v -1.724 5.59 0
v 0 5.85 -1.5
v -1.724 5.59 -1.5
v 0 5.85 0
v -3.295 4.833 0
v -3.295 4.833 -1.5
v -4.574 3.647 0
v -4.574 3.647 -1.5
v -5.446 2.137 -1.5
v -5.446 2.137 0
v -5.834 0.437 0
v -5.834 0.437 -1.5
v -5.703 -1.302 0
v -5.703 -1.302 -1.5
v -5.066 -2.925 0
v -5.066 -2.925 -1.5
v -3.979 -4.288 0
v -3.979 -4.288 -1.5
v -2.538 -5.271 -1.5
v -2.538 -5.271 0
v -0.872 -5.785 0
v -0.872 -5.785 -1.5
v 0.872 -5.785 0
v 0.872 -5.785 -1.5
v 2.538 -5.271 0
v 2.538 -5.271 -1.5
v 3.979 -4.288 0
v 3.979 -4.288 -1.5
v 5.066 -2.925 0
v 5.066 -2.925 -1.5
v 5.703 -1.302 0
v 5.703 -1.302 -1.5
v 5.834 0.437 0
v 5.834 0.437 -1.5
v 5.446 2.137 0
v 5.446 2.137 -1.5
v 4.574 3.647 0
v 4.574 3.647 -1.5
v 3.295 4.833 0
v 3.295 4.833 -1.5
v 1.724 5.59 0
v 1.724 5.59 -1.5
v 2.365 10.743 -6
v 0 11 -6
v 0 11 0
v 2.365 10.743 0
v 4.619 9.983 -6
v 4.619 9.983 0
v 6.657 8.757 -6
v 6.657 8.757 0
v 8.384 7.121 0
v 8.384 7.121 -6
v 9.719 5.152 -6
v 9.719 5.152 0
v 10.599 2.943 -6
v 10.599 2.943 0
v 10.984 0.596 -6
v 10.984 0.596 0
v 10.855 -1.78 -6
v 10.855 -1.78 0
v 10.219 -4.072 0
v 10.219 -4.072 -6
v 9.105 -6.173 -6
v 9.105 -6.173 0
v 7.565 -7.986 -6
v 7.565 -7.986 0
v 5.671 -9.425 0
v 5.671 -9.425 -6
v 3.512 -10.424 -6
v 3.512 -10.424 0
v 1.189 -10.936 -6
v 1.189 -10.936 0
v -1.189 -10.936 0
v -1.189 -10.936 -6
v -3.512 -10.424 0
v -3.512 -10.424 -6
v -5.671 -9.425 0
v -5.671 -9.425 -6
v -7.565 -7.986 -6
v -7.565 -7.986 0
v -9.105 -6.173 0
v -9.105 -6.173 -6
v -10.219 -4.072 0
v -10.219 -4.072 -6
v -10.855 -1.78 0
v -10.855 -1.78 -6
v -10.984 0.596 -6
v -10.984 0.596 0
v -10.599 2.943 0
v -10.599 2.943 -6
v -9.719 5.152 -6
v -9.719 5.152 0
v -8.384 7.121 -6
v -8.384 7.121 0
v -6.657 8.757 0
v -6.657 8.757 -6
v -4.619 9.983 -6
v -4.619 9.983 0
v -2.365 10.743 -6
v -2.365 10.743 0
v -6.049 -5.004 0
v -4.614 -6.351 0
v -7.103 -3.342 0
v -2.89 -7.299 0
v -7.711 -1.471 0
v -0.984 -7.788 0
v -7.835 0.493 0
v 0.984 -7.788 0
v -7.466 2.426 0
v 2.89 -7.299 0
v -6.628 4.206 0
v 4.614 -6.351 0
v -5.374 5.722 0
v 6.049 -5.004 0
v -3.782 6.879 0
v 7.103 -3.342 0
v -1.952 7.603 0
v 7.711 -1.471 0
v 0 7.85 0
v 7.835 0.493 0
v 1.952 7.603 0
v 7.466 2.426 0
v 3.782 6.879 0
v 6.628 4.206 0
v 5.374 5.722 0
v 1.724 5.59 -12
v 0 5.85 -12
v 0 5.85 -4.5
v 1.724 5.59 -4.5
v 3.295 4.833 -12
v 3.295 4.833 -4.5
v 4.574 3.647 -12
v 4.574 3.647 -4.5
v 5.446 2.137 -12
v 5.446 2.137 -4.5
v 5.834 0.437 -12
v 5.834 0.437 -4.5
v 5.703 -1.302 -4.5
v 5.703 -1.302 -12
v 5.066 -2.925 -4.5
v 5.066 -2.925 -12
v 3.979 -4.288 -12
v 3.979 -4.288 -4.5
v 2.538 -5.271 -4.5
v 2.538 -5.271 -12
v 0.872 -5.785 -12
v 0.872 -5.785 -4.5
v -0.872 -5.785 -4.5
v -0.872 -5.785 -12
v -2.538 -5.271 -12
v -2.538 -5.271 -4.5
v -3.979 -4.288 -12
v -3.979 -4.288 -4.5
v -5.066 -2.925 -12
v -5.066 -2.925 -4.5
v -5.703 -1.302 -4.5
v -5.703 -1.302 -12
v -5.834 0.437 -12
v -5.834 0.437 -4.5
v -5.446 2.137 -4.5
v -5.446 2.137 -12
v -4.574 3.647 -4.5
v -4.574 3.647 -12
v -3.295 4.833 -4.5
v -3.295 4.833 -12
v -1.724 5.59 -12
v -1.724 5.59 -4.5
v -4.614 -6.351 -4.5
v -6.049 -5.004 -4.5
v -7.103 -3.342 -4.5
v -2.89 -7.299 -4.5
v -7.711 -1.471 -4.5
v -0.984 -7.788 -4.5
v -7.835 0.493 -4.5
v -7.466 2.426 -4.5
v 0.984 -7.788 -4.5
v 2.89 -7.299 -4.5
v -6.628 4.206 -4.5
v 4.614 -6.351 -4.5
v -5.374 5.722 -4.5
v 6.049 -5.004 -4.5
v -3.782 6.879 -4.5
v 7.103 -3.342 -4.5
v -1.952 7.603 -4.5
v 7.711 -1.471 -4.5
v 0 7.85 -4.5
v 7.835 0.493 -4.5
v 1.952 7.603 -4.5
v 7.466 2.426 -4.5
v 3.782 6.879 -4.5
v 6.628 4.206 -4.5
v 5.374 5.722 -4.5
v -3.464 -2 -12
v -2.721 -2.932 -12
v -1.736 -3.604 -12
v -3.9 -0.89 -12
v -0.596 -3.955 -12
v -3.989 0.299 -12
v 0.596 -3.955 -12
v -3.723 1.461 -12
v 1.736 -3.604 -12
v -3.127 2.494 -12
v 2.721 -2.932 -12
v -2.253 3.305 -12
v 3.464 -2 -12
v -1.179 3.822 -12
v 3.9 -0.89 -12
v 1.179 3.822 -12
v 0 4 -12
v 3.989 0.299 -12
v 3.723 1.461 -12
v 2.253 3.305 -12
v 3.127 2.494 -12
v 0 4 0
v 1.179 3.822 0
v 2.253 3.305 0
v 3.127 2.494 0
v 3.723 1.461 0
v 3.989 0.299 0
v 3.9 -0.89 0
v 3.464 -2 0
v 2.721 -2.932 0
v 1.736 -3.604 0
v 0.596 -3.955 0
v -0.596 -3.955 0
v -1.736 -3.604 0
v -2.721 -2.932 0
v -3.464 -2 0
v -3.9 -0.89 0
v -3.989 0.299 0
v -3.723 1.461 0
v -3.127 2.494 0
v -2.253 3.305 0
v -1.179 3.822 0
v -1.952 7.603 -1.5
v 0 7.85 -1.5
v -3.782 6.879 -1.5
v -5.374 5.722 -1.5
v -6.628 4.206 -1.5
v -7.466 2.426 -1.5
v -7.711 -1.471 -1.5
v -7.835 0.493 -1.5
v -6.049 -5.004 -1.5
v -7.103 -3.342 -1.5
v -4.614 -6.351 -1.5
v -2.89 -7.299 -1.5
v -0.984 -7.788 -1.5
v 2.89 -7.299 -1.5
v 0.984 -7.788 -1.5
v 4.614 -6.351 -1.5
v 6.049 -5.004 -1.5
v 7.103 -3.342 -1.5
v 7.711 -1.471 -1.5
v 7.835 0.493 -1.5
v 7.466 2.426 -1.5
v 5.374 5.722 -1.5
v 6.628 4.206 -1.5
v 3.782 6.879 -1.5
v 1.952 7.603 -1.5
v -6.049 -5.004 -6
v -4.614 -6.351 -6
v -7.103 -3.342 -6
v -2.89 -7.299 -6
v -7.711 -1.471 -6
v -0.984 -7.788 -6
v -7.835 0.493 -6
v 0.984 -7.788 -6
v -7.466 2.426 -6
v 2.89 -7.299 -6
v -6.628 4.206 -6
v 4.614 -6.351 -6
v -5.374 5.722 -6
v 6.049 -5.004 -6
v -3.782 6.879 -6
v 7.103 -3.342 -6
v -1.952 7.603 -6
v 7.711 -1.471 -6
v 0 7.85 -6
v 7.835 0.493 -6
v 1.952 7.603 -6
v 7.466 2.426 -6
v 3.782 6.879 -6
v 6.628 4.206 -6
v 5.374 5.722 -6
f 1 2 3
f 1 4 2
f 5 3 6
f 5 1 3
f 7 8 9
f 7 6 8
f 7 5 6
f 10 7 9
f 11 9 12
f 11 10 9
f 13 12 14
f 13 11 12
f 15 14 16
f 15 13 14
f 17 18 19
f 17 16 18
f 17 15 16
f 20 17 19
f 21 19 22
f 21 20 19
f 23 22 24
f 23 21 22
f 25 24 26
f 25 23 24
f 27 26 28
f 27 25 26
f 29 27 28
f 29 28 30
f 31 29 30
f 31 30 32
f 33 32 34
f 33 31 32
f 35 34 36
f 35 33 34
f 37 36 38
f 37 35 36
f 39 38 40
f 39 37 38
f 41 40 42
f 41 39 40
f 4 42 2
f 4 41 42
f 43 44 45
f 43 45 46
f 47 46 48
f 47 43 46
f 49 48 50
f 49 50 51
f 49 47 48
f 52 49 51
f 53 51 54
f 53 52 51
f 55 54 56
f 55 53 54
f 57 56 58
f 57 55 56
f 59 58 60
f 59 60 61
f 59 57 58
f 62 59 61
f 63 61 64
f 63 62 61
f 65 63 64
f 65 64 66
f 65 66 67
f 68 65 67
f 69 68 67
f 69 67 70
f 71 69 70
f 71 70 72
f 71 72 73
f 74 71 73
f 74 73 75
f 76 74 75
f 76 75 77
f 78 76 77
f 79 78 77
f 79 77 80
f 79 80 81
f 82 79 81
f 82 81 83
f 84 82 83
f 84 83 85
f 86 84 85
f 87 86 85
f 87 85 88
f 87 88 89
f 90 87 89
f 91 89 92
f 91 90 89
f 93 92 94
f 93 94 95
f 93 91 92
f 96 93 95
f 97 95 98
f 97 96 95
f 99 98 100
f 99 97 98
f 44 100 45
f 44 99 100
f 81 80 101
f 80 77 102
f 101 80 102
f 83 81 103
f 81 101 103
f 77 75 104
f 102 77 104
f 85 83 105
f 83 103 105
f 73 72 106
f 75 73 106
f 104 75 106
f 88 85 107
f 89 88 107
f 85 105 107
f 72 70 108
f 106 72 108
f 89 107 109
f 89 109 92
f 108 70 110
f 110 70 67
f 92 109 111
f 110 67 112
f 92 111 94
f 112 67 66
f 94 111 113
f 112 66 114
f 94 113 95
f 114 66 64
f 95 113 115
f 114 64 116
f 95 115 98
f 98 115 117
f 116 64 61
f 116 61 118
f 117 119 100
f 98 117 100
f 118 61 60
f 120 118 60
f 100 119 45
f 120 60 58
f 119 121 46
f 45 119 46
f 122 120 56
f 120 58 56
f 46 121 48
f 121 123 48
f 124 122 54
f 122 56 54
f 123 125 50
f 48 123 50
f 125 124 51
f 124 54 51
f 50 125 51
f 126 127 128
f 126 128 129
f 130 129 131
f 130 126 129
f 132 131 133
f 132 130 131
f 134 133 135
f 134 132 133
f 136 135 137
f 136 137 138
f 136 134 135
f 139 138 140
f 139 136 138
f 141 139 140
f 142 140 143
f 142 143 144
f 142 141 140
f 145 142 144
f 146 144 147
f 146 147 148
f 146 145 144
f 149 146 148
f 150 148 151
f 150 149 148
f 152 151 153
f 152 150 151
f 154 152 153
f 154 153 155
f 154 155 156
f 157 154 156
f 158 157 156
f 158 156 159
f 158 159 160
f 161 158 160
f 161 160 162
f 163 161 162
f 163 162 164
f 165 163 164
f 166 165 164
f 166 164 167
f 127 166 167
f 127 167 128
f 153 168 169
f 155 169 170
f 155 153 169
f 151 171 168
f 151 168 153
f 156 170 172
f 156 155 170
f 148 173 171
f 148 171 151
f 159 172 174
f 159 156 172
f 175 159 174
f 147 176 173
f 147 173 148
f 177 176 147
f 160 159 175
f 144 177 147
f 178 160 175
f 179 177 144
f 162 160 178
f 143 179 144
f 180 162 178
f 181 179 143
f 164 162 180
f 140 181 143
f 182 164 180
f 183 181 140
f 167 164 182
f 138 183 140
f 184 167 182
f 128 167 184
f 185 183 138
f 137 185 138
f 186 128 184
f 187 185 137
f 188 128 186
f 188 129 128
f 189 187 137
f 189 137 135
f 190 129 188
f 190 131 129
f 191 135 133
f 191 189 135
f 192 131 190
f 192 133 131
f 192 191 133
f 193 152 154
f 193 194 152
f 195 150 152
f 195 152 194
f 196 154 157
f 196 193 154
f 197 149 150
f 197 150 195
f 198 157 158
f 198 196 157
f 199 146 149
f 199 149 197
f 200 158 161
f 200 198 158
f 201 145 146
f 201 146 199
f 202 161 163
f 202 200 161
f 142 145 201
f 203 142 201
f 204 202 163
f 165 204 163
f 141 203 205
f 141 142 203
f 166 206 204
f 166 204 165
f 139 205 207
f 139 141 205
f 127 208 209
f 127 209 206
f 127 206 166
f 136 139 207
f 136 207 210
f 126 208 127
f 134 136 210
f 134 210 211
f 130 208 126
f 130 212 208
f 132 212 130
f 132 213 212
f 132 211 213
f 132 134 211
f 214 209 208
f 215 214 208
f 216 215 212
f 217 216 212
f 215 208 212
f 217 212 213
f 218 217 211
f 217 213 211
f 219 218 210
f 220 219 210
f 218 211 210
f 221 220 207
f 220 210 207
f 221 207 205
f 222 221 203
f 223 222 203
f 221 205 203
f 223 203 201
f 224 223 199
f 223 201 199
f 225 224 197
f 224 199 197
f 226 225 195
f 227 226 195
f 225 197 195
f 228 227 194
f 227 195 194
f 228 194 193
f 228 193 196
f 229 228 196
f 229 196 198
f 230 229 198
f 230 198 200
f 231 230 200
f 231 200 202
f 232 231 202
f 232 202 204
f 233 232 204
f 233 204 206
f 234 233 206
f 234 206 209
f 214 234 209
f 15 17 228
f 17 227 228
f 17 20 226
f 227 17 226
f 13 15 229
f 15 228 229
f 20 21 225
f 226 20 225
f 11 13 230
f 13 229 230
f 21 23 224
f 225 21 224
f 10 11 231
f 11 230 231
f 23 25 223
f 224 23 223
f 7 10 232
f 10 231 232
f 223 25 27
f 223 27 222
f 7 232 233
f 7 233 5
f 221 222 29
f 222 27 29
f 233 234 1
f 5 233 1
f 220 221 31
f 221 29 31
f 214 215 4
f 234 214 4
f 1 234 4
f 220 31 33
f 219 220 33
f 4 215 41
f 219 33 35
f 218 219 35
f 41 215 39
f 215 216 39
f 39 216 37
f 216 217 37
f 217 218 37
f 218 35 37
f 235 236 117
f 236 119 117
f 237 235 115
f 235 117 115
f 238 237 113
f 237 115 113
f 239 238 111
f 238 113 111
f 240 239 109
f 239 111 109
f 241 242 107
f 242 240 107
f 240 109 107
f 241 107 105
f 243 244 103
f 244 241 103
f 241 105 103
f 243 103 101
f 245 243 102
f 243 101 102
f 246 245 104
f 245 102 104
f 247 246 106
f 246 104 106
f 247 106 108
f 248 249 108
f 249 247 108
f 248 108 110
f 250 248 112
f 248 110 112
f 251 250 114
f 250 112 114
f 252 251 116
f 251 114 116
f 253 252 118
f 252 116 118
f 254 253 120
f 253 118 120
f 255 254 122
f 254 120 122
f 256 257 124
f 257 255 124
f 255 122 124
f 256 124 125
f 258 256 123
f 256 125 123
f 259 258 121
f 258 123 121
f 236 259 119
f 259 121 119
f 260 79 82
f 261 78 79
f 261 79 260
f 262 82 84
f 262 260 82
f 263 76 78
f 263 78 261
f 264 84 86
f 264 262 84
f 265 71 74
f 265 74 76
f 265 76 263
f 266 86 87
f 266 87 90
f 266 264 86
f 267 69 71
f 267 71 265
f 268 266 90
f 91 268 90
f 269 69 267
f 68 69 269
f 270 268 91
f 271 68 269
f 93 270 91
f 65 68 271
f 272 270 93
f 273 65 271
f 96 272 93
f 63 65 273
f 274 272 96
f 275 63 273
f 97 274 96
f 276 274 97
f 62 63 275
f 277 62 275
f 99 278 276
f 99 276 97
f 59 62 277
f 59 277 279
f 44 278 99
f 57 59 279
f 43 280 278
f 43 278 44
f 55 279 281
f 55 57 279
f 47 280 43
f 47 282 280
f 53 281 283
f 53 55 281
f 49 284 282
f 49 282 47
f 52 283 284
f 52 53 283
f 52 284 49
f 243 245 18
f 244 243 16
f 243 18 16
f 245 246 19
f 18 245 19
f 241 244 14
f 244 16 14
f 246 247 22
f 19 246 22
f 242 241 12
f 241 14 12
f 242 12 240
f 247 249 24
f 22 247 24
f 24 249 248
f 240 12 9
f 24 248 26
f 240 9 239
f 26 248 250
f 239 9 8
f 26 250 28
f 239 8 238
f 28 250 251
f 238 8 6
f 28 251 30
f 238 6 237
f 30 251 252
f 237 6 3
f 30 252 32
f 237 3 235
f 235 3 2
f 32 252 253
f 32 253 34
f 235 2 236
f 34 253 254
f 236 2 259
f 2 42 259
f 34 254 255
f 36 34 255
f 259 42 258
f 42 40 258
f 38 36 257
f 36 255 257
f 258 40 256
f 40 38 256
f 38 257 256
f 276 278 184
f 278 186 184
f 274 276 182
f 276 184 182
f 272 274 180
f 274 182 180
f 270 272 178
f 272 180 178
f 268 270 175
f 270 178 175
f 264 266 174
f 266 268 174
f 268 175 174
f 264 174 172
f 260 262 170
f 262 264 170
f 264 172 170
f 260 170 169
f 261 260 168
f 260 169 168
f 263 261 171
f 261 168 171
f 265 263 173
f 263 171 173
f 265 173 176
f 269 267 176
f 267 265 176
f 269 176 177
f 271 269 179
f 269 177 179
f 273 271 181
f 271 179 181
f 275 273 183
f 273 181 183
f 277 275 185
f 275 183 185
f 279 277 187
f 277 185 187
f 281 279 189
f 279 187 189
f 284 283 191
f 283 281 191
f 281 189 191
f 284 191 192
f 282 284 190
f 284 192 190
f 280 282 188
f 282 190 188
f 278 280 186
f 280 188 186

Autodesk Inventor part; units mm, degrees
ref_plane "YZ Plane" through (0, 0, 0) normal (1, 0, 0) x (0, 1, 0)
ref_plane "XZ Plane" through (0, 0, 0) normal (0, 1, 0) x (-1, 0, 0)
ref_plane "XY Plane" through (0, 0, 0) normal (0, 0, 1) x (1, 0, 0)
sketch "Esquisse1" plane through (0, 0, 0) normal (1, 0, 0) x (0, 1, 0)
  line L0 (0, 21.0755) -> (0, -24.2543)
  line L1 (7.85, -1.5) -> (7.85, 0)
  line L2 (7.85, 0) -> (11, 0)
  line L3 (11, 0) -> (11, -6)
  line L4 (11, -6) -> (7.85, -6)
  line L5 (7.85, -6) -> (7.85, -4.5)
  line L6 (7.85, -4.5) -> (5.85, -4.5)
  line L7 (5.85, -4.5) -> (5.85, -12)
  line L8 (5.85, -12) -> (4, -12)
  line L9 (7.85, -1.5) -> (5.85, -1.5)
  line L10 (5.85, -1.5) -> (5.85, 0)
  line L11 (5.85, 0) -> (4, 0)
  line L12 (4, 0) -> (4, -12)
  line L13 (6.85, -1.5) -> (6.85, -4.5) construction
  line L14 (6.85, -3) -> (11, -3) construction
  point P0 (0, 0)
  point P1 (7.85, -5.25)
  dimension "d0" = 11.7
  dimension "d1" = 8
  dimension "d2" = 12
  dimension "d3" = 6
  dimension "d4" = 22
  dimension "d5" = 2
  dimension "d6" = 3
revolve "Révolution1" add sketch "Esquisse1" angle 360 about axis through (0, 0, 21.0755) along (0, 0, -1)
properties part number "engrenage_simplifie_nouveau"
